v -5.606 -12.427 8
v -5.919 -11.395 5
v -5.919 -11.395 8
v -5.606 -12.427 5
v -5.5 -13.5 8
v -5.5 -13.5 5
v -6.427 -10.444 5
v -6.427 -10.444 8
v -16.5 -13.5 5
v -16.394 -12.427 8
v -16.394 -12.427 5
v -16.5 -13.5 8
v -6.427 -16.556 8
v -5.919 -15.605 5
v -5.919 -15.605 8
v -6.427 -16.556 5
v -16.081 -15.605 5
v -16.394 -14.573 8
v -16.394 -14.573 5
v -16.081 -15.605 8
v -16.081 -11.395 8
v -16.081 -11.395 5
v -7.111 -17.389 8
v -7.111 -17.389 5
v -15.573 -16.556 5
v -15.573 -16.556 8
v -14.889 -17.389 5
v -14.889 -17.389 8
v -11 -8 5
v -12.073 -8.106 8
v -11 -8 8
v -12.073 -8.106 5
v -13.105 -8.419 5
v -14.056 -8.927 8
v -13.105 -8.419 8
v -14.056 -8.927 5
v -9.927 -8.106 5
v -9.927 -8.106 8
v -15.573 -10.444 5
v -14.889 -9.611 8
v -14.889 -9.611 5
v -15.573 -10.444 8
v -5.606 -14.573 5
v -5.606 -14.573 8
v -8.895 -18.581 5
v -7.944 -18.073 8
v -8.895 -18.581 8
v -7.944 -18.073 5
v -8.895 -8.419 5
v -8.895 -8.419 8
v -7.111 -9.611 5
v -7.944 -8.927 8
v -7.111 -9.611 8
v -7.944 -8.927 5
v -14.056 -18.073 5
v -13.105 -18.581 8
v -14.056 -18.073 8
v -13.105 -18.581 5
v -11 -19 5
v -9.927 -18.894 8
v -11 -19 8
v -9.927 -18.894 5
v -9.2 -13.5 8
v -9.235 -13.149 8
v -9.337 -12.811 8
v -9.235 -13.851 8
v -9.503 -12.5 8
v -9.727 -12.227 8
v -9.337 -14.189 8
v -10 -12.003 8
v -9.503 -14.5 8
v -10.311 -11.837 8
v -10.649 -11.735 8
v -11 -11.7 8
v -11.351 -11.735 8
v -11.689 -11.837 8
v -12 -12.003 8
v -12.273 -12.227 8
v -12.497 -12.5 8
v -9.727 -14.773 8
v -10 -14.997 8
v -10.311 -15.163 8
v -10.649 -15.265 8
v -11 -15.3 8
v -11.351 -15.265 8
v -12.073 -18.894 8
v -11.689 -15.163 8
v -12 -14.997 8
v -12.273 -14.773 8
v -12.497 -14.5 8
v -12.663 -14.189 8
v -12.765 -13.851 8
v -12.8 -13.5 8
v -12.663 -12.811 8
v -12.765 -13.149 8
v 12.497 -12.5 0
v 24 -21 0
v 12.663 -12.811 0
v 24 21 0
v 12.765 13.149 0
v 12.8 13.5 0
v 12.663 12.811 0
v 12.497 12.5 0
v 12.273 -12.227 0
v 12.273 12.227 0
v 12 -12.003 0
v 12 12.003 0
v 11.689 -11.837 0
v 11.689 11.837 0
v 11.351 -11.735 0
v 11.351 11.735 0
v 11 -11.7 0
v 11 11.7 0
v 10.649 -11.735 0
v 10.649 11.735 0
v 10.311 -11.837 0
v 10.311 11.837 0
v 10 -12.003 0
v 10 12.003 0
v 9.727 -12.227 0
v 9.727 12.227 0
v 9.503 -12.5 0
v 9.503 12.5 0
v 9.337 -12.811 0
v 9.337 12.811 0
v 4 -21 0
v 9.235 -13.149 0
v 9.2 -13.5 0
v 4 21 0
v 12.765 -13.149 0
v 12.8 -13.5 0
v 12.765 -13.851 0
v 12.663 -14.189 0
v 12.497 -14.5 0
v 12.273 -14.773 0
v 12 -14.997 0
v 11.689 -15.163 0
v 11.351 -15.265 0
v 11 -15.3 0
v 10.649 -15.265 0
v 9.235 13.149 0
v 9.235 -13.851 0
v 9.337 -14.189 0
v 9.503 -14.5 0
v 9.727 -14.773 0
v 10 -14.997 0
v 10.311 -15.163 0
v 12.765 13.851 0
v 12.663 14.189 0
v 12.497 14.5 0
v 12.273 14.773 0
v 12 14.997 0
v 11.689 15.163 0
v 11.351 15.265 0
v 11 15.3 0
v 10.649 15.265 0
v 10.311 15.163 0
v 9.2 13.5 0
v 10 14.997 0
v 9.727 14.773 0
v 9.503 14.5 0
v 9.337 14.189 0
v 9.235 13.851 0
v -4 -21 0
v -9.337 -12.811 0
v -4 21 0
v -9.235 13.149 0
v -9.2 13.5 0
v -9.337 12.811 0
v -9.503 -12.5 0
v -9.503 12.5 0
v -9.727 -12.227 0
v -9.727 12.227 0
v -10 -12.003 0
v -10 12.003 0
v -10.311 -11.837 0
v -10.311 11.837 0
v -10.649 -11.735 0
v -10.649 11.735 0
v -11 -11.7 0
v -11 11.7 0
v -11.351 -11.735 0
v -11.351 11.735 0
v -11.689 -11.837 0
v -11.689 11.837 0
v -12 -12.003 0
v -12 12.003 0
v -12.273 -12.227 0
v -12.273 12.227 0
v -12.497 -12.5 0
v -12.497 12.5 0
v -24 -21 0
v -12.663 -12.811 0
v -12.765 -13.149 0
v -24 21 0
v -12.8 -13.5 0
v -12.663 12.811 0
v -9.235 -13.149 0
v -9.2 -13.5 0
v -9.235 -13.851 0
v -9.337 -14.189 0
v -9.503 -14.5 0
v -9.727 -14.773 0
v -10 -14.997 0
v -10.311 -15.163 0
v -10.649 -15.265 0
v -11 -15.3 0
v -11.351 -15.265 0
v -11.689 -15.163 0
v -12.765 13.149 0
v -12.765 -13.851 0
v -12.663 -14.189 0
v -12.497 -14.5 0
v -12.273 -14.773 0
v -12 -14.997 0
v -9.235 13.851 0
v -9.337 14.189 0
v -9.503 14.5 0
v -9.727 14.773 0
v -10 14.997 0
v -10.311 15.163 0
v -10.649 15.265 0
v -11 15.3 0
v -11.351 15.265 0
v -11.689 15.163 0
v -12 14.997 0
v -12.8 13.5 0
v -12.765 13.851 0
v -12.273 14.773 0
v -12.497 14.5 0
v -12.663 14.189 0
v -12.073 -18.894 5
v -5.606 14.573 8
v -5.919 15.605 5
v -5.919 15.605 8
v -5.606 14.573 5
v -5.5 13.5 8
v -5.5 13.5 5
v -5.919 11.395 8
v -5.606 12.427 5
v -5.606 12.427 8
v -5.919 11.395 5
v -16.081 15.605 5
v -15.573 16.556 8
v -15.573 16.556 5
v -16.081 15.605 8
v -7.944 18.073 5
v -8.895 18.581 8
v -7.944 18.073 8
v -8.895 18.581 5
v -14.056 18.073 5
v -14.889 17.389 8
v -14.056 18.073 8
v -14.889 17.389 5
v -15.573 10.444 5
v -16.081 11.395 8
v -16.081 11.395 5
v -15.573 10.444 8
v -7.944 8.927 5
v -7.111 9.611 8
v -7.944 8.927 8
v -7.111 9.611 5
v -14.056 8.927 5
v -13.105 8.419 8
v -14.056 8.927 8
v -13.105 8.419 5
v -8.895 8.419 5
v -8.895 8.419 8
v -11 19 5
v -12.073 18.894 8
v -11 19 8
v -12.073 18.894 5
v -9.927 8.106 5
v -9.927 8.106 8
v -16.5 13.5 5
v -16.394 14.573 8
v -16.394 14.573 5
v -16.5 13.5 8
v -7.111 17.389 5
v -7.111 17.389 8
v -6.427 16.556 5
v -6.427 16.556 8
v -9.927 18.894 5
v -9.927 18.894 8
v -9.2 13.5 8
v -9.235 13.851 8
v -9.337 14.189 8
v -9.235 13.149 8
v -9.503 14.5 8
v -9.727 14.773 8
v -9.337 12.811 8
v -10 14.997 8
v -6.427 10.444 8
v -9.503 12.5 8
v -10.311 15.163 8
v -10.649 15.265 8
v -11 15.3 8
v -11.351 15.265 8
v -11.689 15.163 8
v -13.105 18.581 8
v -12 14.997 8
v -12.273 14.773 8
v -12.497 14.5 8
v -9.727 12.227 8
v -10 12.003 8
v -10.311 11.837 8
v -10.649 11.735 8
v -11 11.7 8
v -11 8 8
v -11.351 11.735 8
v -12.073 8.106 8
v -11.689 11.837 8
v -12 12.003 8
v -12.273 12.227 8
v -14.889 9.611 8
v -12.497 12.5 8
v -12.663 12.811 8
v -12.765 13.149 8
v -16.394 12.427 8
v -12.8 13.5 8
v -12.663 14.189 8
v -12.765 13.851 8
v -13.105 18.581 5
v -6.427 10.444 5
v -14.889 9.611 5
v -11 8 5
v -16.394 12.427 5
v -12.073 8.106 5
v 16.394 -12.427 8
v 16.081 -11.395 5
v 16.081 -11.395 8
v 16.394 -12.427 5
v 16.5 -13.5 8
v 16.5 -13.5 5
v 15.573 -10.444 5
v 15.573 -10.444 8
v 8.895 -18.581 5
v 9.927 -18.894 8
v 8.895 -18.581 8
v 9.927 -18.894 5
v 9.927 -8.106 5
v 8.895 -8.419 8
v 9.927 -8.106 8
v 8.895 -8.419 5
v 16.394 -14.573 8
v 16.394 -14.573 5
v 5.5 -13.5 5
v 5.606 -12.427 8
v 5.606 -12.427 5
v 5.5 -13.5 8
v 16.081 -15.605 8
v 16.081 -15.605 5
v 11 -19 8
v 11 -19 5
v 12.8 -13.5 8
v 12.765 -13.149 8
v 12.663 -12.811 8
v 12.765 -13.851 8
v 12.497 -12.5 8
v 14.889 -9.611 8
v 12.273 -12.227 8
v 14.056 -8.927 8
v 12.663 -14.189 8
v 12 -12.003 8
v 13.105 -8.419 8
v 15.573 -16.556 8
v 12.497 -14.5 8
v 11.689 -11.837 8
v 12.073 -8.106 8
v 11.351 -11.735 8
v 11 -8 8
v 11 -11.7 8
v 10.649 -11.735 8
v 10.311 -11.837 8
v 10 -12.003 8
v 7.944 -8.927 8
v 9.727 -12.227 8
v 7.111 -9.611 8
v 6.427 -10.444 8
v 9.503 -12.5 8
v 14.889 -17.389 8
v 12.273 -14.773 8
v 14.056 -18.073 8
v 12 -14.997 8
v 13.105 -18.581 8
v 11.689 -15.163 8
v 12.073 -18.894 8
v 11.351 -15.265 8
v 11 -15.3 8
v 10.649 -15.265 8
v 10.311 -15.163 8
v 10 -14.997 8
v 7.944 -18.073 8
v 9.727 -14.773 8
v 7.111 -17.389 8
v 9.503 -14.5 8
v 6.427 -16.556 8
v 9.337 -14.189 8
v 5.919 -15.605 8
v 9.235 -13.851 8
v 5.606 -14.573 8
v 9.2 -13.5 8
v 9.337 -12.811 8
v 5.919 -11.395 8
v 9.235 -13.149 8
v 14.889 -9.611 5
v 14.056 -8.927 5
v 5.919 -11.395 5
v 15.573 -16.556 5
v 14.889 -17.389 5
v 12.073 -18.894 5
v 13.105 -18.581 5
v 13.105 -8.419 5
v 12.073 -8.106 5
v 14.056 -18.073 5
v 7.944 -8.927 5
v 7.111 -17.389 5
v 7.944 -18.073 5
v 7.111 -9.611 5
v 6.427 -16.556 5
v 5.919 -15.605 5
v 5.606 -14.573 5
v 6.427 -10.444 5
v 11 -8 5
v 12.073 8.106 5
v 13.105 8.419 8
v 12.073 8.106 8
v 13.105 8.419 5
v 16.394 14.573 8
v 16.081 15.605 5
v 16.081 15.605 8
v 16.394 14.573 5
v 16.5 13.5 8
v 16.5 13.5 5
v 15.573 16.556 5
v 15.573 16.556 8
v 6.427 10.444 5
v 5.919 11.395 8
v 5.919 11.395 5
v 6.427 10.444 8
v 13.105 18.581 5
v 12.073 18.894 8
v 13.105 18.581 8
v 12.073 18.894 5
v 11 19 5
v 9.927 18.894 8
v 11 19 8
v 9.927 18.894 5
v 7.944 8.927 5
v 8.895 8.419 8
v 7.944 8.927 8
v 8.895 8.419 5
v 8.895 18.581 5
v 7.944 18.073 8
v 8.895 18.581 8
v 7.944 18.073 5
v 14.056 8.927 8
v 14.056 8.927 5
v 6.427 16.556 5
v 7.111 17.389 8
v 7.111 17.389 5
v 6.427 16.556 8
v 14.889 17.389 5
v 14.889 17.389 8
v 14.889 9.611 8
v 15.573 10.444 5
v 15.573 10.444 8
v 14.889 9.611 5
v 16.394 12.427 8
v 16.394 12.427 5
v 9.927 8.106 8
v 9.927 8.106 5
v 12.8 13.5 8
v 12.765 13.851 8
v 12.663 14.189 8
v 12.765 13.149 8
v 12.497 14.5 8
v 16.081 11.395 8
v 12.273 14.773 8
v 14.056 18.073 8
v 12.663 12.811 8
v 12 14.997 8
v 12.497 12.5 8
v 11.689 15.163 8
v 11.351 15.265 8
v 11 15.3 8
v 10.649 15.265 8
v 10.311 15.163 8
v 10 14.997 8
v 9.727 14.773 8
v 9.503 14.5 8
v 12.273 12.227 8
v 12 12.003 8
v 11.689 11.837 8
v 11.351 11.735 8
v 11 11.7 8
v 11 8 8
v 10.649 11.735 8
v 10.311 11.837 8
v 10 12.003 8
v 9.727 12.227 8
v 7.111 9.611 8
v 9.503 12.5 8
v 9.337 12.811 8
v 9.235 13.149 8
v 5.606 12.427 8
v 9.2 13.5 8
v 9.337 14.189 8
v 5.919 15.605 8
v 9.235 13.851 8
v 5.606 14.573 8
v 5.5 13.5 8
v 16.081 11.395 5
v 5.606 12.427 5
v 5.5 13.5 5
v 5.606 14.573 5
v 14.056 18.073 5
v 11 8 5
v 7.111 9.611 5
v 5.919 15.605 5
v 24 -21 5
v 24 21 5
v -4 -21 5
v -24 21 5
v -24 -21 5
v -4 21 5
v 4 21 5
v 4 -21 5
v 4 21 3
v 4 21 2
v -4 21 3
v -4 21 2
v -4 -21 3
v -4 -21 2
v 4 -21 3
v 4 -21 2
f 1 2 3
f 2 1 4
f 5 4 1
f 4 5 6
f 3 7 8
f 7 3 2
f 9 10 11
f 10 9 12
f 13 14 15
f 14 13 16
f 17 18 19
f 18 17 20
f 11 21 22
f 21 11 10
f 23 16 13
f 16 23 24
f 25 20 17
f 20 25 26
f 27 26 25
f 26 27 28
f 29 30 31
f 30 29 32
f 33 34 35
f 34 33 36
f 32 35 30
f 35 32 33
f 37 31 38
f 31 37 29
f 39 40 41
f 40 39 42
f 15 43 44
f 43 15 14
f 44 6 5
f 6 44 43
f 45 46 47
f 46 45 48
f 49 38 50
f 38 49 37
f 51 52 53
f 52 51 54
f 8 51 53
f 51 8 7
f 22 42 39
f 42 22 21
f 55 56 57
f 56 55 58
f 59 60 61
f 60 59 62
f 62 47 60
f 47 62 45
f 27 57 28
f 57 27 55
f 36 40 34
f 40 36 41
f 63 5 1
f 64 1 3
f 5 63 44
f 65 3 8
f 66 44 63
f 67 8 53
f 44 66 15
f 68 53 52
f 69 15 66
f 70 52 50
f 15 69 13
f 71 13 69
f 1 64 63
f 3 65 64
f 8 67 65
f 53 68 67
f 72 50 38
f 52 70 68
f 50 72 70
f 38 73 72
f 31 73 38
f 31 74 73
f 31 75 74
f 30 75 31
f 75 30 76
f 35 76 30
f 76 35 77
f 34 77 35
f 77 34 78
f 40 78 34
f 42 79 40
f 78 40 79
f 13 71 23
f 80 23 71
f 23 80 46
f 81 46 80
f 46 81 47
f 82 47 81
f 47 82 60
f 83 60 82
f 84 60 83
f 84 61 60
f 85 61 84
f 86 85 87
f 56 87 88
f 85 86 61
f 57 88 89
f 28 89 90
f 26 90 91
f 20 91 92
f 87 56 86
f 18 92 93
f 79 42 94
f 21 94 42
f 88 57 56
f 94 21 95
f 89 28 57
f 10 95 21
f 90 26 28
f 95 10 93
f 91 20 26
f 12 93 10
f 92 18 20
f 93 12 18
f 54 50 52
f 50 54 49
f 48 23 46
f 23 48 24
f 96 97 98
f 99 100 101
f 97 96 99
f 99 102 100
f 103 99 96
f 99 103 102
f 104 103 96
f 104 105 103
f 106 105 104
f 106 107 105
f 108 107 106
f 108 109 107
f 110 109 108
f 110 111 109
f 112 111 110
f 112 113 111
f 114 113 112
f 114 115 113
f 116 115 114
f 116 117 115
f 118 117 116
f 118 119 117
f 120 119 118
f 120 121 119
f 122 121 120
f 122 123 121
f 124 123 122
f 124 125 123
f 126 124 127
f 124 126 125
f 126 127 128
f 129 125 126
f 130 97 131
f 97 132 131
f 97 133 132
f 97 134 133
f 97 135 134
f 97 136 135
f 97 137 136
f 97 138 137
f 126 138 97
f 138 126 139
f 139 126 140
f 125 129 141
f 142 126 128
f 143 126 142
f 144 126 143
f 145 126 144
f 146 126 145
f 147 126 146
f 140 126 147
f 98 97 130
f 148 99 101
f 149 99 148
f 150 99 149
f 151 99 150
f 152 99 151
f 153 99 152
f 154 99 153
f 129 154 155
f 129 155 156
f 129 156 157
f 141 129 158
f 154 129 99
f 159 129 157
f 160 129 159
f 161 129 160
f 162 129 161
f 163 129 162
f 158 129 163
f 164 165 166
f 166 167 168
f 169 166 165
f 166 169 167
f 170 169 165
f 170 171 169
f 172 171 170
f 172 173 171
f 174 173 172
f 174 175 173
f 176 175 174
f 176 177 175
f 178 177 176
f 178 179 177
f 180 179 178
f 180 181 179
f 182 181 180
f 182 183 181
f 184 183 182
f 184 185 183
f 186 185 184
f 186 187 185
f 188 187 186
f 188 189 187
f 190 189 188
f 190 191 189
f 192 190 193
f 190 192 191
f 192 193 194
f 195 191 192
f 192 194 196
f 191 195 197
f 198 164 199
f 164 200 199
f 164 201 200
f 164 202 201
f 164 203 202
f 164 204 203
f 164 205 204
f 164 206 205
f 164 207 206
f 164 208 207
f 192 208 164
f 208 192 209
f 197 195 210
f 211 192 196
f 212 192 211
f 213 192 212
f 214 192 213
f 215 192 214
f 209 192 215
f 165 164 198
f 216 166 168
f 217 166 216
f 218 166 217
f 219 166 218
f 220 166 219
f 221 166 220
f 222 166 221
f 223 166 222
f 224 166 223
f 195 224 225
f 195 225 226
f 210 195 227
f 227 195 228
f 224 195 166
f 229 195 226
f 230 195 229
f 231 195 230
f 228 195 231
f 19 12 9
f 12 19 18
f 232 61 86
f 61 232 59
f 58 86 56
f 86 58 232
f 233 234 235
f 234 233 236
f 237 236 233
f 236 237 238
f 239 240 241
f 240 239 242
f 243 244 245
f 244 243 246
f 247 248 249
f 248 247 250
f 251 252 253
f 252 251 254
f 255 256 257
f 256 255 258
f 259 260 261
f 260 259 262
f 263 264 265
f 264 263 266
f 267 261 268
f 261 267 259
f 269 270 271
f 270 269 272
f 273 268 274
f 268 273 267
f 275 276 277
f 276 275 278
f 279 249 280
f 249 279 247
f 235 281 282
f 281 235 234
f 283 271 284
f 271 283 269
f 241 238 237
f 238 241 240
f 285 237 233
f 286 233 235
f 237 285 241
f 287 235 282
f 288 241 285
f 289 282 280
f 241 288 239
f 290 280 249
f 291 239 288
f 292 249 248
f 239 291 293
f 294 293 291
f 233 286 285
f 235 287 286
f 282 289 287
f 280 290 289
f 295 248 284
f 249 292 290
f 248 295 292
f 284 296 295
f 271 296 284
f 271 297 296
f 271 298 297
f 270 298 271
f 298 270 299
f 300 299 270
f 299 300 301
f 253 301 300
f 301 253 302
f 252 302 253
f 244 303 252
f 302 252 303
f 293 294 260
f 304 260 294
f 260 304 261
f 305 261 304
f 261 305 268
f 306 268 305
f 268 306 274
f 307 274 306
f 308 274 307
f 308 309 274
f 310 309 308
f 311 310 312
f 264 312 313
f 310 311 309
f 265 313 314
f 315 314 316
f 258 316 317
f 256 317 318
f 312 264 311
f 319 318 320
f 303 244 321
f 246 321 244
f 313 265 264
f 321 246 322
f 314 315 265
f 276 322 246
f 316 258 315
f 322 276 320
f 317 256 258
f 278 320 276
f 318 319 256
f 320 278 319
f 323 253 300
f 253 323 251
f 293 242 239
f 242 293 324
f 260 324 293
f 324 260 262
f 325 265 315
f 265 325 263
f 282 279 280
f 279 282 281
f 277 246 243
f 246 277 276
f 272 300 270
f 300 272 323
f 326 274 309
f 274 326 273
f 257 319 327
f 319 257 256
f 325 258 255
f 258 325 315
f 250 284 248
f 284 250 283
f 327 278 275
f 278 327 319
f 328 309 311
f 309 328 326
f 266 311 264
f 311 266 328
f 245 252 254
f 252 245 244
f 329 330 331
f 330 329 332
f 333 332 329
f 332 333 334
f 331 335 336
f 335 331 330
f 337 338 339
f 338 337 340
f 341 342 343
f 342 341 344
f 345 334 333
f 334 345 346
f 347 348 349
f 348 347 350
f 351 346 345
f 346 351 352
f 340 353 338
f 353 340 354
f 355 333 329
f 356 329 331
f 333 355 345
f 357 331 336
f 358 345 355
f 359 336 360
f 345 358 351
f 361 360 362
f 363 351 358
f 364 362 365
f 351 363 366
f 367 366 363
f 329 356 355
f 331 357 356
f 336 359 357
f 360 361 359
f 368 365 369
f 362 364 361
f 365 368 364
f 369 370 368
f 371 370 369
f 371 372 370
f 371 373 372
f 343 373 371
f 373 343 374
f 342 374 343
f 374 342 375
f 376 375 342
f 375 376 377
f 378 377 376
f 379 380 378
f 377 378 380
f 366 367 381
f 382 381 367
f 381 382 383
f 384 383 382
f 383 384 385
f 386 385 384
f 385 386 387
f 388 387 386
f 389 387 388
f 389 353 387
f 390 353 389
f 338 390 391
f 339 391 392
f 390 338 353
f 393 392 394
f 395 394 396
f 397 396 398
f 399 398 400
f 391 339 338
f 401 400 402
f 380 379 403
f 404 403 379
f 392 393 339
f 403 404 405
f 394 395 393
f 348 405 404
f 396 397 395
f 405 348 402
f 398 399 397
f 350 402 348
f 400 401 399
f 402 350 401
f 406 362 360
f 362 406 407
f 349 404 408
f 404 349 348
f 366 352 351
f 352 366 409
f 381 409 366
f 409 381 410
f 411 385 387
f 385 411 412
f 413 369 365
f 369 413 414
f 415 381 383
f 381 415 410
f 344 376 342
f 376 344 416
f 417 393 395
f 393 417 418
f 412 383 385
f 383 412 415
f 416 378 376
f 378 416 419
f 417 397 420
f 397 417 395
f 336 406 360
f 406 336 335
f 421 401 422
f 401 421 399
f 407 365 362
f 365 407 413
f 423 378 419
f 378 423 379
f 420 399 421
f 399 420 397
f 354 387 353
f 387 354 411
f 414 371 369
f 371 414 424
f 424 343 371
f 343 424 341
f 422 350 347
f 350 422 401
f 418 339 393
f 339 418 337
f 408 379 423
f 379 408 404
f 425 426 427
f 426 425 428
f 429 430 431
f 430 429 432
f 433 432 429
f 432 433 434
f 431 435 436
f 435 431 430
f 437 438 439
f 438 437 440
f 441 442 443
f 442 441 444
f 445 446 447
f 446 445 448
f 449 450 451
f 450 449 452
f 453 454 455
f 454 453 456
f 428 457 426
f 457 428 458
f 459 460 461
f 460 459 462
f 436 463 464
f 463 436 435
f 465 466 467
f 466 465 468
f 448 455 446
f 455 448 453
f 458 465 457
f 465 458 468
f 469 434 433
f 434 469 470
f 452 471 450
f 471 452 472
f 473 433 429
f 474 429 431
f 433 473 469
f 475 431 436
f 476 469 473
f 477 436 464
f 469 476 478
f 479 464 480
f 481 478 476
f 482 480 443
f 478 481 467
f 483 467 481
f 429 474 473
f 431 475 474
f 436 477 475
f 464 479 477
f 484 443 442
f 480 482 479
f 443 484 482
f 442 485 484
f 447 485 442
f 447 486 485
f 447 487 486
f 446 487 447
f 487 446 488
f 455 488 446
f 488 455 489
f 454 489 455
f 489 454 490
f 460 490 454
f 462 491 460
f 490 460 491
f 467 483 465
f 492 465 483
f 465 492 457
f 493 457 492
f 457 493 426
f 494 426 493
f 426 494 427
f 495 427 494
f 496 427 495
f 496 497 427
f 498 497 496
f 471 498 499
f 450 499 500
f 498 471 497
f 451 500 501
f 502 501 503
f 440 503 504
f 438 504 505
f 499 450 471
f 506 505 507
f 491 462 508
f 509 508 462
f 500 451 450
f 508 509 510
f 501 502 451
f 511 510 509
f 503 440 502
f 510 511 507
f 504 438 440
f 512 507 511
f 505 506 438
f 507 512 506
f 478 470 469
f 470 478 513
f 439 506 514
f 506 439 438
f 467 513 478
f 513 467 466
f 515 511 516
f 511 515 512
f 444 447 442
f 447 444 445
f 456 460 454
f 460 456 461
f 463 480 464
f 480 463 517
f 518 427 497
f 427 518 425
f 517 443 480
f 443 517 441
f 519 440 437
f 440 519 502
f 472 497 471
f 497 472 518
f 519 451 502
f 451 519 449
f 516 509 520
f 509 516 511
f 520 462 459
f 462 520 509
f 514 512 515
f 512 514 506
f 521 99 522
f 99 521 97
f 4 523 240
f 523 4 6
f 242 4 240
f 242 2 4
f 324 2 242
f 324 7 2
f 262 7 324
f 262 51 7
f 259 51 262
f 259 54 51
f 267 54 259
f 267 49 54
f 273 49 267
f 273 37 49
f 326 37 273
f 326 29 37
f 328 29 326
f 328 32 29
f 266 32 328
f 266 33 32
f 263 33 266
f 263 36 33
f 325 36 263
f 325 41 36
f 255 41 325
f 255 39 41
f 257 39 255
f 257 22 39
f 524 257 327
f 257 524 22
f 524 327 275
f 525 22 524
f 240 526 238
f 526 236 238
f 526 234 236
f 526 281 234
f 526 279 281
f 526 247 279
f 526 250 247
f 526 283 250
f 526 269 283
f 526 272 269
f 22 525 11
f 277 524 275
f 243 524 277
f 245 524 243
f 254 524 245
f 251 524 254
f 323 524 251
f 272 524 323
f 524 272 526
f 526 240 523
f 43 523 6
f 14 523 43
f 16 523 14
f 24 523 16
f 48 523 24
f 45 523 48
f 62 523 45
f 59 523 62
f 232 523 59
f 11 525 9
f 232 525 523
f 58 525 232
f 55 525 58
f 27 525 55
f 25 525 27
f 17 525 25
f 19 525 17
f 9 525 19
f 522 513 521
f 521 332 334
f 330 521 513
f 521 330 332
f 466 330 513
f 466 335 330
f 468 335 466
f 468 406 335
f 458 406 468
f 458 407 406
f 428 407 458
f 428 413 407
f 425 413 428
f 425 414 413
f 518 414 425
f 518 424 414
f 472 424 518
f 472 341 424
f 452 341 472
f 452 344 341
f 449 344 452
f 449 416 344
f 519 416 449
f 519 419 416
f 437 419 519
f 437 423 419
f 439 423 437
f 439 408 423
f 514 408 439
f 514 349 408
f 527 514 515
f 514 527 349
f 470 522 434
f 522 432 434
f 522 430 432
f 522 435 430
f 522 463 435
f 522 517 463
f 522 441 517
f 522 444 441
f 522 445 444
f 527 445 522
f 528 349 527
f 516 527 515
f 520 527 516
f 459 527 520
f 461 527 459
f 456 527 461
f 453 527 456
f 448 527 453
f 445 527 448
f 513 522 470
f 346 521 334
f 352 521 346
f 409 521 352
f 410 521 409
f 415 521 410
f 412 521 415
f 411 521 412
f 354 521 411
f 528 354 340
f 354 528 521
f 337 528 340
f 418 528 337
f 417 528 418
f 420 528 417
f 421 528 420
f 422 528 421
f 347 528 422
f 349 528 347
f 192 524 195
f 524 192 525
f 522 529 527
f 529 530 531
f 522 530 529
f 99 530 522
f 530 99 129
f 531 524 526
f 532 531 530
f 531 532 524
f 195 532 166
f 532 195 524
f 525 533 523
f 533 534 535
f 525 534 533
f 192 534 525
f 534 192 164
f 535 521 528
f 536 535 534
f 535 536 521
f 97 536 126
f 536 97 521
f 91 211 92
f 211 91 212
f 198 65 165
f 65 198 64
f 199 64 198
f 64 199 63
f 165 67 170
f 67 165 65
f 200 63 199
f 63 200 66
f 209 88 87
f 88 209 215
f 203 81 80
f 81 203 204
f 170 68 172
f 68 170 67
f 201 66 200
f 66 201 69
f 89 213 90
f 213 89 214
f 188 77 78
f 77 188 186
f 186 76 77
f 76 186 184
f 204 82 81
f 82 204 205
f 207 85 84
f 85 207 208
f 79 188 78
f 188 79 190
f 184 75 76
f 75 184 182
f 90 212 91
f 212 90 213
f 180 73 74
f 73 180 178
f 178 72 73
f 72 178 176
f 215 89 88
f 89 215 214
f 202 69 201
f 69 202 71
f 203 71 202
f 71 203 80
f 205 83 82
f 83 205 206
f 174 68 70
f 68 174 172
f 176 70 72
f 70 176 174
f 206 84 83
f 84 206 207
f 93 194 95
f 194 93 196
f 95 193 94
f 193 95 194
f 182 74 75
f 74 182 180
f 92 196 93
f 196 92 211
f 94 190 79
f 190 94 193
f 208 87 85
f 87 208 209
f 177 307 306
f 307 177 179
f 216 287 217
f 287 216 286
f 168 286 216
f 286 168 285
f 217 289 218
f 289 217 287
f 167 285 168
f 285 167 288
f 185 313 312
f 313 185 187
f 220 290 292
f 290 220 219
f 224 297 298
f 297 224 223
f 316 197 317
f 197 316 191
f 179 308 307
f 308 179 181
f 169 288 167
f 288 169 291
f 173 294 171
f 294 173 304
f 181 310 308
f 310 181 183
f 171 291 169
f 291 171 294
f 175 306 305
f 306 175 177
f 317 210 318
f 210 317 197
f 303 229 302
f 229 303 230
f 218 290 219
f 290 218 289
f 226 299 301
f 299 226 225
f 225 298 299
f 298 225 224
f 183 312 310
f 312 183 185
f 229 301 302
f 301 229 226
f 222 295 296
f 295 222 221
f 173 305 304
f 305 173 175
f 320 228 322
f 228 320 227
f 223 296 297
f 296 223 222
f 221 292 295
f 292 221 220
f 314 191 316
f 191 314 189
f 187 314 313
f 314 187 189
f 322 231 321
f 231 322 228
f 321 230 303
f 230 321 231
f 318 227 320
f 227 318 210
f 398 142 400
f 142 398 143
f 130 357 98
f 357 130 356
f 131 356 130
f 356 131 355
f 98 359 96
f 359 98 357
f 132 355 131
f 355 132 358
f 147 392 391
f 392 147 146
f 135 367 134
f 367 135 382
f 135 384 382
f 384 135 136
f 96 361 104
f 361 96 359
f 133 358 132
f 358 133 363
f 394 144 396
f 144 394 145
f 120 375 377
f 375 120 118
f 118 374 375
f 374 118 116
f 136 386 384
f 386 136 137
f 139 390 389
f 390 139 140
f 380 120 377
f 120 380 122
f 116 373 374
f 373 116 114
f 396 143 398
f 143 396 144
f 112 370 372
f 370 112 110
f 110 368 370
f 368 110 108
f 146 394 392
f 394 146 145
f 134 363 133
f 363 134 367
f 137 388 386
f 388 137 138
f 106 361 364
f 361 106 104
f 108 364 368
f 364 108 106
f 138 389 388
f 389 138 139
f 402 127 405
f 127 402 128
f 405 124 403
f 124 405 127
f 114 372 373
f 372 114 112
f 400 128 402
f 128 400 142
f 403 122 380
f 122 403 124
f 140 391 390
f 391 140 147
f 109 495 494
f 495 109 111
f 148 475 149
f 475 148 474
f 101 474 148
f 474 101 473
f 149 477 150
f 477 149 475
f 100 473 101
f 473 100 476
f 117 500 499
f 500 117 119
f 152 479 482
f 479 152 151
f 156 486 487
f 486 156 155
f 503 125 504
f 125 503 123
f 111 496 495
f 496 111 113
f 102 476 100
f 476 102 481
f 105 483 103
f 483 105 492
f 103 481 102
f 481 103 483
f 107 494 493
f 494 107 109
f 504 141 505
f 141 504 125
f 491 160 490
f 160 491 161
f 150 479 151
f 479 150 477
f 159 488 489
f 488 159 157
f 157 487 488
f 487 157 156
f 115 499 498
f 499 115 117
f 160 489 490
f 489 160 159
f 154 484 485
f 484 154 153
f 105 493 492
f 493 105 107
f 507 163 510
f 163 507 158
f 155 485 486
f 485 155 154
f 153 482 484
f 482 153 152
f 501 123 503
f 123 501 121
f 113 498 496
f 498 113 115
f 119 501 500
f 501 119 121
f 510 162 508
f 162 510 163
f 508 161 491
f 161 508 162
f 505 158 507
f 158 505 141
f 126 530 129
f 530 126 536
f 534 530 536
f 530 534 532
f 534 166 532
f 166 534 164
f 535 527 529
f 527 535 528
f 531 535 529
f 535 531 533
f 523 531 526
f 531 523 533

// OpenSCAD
$fn = 32;

// ----------------------------------------------------------------------
// Living hinge: 48 x 42 mm plates, 1 mm flexible web
// ----------------------------------------------------------------------

// --- parameters (mm) ---
plate_len = 20;           // plate length outside the web
plate_w = 42;             // plate width
thick = 5;                // plate thickness
web_half = 4;             // half width of the flex band
web_t = 1;                // flexible web thickness
web_z = 2;                // web position inside the thickness
boss_d = 11;              // screw boss diameter
boss_h = 8;               // screw boss height
boss_x = 11;              // screw boss distance from the web
screw_d = 3.6;            // screw hole

difference() {
  union() {
    /* one flat strip, later thinned at the middle */
    translate([-24, -21, 0]) cube([48, 42, 5]);
    /* screw bosses, sunk 0.5 mm into the plates */
    for (sx = [-11, 11]) {
      for (sy = [-13.5, 13.5]) {
        translate([sx, sy, 0]) cylinder(h = boss_h, d = boss_d);
      }
    }
  }
  /* channel from below: leaves the web on top of it */
  translate([-4, -23.5, -2.5]) cube([8, 47, 4.5]);
  /* channel from above: thins the web down to web_t */
  translate([-4, -23.5, 3]) cube([8, 47, 4.5]);
  /* screw holes through the bosses */
  for (sx = [-11, 11]) {
    for (sy = [-13.5, 13.5]) {
      translate([sx, sy, -2.5]) cylinder(h = boss_h + 5, d = screw_d);
    }
  }
}
